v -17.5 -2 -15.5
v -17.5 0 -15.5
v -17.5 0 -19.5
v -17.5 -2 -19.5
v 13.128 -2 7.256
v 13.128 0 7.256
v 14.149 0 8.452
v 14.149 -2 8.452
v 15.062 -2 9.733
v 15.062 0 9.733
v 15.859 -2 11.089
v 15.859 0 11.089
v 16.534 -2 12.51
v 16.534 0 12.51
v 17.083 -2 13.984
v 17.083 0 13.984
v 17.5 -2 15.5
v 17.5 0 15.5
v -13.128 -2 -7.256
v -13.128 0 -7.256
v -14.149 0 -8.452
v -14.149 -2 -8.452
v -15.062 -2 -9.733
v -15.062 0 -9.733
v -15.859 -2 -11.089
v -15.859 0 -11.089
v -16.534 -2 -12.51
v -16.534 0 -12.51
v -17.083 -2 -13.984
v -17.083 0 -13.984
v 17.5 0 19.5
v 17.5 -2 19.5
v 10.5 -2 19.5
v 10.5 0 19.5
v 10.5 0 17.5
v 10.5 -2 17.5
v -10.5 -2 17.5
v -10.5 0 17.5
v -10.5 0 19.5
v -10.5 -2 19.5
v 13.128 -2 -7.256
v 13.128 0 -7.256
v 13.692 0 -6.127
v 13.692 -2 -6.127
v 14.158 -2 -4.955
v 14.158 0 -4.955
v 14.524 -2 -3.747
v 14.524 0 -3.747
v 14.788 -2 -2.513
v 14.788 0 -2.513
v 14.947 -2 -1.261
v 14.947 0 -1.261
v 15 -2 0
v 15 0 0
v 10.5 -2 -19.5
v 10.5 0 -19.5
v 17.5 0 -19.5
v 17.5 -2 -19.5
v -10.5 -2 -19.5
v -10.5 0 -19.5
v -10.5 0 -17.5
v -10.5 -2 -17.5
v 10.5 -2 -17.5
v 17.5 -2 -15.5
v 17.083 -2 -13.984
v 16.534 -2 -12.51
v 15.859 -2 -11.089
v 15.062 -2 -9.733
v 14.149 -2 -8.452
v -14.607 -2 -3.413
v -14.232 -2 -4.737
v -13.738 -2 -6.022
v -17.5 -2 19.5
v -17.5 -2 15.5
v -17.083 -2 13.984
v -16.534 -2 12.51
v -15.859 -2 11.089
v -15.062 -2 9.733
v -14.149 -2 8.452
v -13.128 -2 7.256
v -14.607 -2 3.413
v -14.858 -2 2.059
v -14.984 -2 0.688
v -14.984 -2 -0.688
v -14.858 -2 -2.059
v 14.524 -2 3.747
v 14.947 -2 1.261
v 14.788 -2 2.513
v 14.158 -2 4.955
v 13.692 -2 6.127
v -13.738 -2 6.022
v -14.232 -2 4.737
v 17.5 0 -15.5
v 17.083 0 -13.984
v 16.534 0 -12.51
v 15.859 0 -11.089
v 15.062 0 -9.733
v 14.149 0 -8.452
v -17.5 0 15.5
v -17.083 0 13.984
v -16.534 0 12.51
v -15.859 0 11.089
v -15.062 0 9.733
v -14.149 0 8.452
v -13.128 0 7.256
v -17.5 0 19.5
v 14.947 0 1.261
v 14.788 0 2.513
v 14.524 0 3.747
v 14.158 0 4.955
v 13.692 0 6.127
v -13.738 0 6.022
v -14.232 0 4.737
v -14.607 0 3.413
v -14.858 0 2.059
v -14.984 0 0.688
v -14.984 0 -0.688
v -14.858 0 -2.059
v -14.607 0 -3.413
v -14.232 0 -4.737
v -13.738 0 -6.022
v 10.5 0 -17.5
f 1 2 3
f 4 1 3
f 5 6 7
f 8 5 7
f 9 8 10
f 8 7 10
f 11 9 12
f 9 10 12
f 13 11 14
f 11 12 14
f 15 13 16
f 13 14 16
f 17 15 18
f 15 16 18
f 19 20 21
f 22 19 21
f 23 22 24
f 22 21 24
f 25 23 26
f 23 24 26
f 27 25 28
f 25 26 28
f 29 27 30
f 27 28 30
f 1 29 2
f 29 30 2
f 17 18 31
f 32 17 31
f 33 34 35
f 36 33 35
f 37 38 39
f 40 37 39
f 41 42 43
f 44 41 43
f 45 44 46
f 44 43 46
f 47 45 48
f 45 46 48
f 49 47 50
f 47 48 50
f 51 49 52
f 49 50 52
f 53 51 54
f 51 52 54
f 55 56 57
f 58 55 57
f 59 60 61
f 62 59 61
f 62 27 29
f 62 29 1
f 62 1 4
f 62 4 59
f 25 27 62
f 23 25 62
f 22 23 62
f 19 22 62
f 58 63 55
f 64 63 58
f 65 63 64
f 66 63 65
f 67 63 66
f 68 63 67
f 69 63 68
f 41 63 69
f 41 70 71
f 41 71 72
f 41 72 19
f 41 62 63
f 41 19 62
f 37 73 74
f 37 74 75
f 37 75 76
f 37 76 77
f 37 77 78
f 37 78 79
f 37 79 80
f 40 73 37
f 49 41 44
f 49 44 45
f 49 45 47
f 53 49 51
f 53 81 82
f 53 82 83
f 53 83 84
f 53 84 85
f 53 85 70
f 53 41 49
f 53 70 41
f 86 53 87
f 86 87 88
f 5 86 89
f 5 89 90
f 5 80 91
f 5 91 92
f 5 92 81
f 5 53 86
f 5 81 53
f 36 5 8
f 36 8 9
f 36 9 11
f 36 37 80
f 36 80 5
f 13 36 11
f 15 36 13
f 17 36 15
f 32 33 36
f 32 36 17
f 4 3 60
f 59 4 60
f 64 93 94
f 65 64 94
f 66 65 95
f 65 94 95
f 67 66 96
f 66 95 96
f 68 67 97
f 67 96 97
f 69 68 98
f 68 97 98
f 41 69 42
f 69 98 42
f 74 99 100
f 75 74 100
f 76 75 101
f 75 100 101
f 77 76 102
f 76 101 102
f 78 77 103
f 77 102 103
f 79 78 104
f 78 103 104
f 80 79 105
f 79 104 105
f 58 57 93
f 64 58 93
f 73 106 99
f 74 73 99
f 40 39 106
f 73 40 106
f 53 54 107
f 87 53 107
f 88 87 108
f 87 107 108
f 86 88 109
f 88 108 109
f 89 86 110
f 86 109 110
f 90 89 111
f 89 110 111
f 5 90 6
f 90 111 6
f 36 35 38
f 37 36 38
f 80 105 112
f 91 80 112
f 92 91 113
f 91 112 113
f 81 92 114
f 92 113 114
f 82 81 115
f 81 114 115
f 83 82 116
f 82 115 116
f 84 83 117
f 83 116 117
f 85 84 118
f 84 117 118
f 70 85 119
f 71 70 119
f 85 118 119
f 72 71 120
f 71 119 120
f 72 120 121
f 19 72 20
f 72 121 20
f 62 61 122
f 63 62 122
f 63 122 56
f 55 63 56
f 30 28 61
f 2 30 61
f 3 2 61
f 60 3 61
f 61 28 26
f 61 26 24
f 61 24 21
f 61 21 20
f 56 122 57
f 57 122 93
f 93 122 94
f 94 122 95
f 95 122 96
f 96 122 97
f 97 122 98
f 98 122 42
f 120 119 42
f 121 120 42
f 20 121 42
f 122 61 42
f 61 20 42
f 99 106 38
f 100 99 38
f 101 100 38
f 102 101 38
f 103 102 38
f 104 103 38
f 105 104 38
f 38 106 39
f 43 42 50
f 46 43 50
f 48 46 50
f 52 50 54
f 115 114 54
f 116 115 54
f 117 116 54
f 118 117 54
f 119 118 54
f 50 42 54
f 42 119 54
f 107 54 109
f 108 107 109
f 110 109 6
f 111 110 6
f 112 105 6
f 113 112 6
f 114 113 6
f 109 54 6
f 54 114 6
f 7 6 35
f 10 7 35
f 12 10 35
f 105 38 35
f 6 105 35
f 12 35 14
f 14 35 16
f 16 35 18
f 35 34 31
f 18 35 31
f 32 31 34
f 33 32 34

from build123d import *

# Parameters (mm, degrees)
F1_DEPTH = 2


with BuildPart() as f1:
    # F0 (on Front) → F1 (new body)
    with BuildSketch(Plane.XZ):
        with BuildLine():
            ThreePointArc((13.1280048062, -7.2564102564), (14.5244633652, -3.746993989), (15, 0))
            ThreePointArc((15, 0), (14.5244633652, 3.746993989), (13.1280048062, 7.2564102564))
            ThreePointArc((13.1280048062, 7.2564102564), (0, 1.548676929), (-13.1280048062, 7.2564102564))
            ThreePointArc((-13.1280048062, 7.2564102564), (-15, 0), (-13.1280048062, -7.2564102564))
            ThreePointArc((-13.1280048062, -7.2564102564), (0, -1.548676929), (13.1280048062, -7.2564102564))
        make_face()
        with BuildLine():
            ThreePointArc((-13.1280048062, 7.2564102564), (0, 1.548676929), (13.1280048062, 7.2564102564))
            ThreePointArc((13.1280048062, 7.2564102564), (0, 15), (-13.1280048062, 7.2564102564))
        make_face()
        with BuildLine():
            ThreePointArc((-13.1280048062, 7.2564102564), (0, 15), (13.1280048062, 7.2564102564))
            ThreePointArc((13.1280048062, 7.2564102564), (15.8589994188, 11.0891654734), (17.5, 15.5))
            Line((17.5, 15.5), (17.5, 19.5))
            Line((17.5, 19.5), (10.5, 19.5))
            Line((10.5, 19.5), (10.5, 17.5))
            Line((10.5, 17.5), (-10.5, 17.5))
            Line((-10.5, 17.5), (-10.5, 19.5))
            Line((-10.5, 19.5), (-17.5, 19.5))
            Line((-17.5, 19.5), (-17.5, 15.5))
            ThreePointArc((-17.5, 15.5), (-15.8589994188, 11.0891654734), (-13.1280048062, 7.2564102564))
        make_face()
        with BuildLine():
            ThreePointArc((17.5, -15.5), (15.8589994188, -11.0891654734), (13.1280048062, -7.2564102564))
            ThreePointArc((13.1280048062, -7.2564102564), (0, -15), (-13.1280048062, -7.2564102564))
            ThreePointArc((-13.1280048062, -7.2564102564), (-15.8589994188, -11.0891654734), (-17.5, -15.5))
            Line((-17.5, -15.5), (-17.5, -19.5))
            Line((-17.5, -19.5), (-10.5, -19.5))
            Line((-10.5, -19.5), (-10.5, -17.5))
            Line((-10.5, -17.5), (10.5, -17.5))
            Line((10.5, -17.5), (10.5, -19.5))
            Line((10.5, -19.5), (17.5, -19.5))
            Line((17.5, -19.5), (17.5, -15.5))
        make_face()
        with BuildLine():
            ThreePointArc((-13.1280048062, -7.2564102564), (0, -15), (13.1280048062, -7.2564102564))
            ThreePointArc((13.1280048062, -7.2564102564), (0, -1.548676929), (-13.1280048062, -7.2564102564))
        make_face()
    extrude(amount=F1_DEPTH)


solid = f1.part
